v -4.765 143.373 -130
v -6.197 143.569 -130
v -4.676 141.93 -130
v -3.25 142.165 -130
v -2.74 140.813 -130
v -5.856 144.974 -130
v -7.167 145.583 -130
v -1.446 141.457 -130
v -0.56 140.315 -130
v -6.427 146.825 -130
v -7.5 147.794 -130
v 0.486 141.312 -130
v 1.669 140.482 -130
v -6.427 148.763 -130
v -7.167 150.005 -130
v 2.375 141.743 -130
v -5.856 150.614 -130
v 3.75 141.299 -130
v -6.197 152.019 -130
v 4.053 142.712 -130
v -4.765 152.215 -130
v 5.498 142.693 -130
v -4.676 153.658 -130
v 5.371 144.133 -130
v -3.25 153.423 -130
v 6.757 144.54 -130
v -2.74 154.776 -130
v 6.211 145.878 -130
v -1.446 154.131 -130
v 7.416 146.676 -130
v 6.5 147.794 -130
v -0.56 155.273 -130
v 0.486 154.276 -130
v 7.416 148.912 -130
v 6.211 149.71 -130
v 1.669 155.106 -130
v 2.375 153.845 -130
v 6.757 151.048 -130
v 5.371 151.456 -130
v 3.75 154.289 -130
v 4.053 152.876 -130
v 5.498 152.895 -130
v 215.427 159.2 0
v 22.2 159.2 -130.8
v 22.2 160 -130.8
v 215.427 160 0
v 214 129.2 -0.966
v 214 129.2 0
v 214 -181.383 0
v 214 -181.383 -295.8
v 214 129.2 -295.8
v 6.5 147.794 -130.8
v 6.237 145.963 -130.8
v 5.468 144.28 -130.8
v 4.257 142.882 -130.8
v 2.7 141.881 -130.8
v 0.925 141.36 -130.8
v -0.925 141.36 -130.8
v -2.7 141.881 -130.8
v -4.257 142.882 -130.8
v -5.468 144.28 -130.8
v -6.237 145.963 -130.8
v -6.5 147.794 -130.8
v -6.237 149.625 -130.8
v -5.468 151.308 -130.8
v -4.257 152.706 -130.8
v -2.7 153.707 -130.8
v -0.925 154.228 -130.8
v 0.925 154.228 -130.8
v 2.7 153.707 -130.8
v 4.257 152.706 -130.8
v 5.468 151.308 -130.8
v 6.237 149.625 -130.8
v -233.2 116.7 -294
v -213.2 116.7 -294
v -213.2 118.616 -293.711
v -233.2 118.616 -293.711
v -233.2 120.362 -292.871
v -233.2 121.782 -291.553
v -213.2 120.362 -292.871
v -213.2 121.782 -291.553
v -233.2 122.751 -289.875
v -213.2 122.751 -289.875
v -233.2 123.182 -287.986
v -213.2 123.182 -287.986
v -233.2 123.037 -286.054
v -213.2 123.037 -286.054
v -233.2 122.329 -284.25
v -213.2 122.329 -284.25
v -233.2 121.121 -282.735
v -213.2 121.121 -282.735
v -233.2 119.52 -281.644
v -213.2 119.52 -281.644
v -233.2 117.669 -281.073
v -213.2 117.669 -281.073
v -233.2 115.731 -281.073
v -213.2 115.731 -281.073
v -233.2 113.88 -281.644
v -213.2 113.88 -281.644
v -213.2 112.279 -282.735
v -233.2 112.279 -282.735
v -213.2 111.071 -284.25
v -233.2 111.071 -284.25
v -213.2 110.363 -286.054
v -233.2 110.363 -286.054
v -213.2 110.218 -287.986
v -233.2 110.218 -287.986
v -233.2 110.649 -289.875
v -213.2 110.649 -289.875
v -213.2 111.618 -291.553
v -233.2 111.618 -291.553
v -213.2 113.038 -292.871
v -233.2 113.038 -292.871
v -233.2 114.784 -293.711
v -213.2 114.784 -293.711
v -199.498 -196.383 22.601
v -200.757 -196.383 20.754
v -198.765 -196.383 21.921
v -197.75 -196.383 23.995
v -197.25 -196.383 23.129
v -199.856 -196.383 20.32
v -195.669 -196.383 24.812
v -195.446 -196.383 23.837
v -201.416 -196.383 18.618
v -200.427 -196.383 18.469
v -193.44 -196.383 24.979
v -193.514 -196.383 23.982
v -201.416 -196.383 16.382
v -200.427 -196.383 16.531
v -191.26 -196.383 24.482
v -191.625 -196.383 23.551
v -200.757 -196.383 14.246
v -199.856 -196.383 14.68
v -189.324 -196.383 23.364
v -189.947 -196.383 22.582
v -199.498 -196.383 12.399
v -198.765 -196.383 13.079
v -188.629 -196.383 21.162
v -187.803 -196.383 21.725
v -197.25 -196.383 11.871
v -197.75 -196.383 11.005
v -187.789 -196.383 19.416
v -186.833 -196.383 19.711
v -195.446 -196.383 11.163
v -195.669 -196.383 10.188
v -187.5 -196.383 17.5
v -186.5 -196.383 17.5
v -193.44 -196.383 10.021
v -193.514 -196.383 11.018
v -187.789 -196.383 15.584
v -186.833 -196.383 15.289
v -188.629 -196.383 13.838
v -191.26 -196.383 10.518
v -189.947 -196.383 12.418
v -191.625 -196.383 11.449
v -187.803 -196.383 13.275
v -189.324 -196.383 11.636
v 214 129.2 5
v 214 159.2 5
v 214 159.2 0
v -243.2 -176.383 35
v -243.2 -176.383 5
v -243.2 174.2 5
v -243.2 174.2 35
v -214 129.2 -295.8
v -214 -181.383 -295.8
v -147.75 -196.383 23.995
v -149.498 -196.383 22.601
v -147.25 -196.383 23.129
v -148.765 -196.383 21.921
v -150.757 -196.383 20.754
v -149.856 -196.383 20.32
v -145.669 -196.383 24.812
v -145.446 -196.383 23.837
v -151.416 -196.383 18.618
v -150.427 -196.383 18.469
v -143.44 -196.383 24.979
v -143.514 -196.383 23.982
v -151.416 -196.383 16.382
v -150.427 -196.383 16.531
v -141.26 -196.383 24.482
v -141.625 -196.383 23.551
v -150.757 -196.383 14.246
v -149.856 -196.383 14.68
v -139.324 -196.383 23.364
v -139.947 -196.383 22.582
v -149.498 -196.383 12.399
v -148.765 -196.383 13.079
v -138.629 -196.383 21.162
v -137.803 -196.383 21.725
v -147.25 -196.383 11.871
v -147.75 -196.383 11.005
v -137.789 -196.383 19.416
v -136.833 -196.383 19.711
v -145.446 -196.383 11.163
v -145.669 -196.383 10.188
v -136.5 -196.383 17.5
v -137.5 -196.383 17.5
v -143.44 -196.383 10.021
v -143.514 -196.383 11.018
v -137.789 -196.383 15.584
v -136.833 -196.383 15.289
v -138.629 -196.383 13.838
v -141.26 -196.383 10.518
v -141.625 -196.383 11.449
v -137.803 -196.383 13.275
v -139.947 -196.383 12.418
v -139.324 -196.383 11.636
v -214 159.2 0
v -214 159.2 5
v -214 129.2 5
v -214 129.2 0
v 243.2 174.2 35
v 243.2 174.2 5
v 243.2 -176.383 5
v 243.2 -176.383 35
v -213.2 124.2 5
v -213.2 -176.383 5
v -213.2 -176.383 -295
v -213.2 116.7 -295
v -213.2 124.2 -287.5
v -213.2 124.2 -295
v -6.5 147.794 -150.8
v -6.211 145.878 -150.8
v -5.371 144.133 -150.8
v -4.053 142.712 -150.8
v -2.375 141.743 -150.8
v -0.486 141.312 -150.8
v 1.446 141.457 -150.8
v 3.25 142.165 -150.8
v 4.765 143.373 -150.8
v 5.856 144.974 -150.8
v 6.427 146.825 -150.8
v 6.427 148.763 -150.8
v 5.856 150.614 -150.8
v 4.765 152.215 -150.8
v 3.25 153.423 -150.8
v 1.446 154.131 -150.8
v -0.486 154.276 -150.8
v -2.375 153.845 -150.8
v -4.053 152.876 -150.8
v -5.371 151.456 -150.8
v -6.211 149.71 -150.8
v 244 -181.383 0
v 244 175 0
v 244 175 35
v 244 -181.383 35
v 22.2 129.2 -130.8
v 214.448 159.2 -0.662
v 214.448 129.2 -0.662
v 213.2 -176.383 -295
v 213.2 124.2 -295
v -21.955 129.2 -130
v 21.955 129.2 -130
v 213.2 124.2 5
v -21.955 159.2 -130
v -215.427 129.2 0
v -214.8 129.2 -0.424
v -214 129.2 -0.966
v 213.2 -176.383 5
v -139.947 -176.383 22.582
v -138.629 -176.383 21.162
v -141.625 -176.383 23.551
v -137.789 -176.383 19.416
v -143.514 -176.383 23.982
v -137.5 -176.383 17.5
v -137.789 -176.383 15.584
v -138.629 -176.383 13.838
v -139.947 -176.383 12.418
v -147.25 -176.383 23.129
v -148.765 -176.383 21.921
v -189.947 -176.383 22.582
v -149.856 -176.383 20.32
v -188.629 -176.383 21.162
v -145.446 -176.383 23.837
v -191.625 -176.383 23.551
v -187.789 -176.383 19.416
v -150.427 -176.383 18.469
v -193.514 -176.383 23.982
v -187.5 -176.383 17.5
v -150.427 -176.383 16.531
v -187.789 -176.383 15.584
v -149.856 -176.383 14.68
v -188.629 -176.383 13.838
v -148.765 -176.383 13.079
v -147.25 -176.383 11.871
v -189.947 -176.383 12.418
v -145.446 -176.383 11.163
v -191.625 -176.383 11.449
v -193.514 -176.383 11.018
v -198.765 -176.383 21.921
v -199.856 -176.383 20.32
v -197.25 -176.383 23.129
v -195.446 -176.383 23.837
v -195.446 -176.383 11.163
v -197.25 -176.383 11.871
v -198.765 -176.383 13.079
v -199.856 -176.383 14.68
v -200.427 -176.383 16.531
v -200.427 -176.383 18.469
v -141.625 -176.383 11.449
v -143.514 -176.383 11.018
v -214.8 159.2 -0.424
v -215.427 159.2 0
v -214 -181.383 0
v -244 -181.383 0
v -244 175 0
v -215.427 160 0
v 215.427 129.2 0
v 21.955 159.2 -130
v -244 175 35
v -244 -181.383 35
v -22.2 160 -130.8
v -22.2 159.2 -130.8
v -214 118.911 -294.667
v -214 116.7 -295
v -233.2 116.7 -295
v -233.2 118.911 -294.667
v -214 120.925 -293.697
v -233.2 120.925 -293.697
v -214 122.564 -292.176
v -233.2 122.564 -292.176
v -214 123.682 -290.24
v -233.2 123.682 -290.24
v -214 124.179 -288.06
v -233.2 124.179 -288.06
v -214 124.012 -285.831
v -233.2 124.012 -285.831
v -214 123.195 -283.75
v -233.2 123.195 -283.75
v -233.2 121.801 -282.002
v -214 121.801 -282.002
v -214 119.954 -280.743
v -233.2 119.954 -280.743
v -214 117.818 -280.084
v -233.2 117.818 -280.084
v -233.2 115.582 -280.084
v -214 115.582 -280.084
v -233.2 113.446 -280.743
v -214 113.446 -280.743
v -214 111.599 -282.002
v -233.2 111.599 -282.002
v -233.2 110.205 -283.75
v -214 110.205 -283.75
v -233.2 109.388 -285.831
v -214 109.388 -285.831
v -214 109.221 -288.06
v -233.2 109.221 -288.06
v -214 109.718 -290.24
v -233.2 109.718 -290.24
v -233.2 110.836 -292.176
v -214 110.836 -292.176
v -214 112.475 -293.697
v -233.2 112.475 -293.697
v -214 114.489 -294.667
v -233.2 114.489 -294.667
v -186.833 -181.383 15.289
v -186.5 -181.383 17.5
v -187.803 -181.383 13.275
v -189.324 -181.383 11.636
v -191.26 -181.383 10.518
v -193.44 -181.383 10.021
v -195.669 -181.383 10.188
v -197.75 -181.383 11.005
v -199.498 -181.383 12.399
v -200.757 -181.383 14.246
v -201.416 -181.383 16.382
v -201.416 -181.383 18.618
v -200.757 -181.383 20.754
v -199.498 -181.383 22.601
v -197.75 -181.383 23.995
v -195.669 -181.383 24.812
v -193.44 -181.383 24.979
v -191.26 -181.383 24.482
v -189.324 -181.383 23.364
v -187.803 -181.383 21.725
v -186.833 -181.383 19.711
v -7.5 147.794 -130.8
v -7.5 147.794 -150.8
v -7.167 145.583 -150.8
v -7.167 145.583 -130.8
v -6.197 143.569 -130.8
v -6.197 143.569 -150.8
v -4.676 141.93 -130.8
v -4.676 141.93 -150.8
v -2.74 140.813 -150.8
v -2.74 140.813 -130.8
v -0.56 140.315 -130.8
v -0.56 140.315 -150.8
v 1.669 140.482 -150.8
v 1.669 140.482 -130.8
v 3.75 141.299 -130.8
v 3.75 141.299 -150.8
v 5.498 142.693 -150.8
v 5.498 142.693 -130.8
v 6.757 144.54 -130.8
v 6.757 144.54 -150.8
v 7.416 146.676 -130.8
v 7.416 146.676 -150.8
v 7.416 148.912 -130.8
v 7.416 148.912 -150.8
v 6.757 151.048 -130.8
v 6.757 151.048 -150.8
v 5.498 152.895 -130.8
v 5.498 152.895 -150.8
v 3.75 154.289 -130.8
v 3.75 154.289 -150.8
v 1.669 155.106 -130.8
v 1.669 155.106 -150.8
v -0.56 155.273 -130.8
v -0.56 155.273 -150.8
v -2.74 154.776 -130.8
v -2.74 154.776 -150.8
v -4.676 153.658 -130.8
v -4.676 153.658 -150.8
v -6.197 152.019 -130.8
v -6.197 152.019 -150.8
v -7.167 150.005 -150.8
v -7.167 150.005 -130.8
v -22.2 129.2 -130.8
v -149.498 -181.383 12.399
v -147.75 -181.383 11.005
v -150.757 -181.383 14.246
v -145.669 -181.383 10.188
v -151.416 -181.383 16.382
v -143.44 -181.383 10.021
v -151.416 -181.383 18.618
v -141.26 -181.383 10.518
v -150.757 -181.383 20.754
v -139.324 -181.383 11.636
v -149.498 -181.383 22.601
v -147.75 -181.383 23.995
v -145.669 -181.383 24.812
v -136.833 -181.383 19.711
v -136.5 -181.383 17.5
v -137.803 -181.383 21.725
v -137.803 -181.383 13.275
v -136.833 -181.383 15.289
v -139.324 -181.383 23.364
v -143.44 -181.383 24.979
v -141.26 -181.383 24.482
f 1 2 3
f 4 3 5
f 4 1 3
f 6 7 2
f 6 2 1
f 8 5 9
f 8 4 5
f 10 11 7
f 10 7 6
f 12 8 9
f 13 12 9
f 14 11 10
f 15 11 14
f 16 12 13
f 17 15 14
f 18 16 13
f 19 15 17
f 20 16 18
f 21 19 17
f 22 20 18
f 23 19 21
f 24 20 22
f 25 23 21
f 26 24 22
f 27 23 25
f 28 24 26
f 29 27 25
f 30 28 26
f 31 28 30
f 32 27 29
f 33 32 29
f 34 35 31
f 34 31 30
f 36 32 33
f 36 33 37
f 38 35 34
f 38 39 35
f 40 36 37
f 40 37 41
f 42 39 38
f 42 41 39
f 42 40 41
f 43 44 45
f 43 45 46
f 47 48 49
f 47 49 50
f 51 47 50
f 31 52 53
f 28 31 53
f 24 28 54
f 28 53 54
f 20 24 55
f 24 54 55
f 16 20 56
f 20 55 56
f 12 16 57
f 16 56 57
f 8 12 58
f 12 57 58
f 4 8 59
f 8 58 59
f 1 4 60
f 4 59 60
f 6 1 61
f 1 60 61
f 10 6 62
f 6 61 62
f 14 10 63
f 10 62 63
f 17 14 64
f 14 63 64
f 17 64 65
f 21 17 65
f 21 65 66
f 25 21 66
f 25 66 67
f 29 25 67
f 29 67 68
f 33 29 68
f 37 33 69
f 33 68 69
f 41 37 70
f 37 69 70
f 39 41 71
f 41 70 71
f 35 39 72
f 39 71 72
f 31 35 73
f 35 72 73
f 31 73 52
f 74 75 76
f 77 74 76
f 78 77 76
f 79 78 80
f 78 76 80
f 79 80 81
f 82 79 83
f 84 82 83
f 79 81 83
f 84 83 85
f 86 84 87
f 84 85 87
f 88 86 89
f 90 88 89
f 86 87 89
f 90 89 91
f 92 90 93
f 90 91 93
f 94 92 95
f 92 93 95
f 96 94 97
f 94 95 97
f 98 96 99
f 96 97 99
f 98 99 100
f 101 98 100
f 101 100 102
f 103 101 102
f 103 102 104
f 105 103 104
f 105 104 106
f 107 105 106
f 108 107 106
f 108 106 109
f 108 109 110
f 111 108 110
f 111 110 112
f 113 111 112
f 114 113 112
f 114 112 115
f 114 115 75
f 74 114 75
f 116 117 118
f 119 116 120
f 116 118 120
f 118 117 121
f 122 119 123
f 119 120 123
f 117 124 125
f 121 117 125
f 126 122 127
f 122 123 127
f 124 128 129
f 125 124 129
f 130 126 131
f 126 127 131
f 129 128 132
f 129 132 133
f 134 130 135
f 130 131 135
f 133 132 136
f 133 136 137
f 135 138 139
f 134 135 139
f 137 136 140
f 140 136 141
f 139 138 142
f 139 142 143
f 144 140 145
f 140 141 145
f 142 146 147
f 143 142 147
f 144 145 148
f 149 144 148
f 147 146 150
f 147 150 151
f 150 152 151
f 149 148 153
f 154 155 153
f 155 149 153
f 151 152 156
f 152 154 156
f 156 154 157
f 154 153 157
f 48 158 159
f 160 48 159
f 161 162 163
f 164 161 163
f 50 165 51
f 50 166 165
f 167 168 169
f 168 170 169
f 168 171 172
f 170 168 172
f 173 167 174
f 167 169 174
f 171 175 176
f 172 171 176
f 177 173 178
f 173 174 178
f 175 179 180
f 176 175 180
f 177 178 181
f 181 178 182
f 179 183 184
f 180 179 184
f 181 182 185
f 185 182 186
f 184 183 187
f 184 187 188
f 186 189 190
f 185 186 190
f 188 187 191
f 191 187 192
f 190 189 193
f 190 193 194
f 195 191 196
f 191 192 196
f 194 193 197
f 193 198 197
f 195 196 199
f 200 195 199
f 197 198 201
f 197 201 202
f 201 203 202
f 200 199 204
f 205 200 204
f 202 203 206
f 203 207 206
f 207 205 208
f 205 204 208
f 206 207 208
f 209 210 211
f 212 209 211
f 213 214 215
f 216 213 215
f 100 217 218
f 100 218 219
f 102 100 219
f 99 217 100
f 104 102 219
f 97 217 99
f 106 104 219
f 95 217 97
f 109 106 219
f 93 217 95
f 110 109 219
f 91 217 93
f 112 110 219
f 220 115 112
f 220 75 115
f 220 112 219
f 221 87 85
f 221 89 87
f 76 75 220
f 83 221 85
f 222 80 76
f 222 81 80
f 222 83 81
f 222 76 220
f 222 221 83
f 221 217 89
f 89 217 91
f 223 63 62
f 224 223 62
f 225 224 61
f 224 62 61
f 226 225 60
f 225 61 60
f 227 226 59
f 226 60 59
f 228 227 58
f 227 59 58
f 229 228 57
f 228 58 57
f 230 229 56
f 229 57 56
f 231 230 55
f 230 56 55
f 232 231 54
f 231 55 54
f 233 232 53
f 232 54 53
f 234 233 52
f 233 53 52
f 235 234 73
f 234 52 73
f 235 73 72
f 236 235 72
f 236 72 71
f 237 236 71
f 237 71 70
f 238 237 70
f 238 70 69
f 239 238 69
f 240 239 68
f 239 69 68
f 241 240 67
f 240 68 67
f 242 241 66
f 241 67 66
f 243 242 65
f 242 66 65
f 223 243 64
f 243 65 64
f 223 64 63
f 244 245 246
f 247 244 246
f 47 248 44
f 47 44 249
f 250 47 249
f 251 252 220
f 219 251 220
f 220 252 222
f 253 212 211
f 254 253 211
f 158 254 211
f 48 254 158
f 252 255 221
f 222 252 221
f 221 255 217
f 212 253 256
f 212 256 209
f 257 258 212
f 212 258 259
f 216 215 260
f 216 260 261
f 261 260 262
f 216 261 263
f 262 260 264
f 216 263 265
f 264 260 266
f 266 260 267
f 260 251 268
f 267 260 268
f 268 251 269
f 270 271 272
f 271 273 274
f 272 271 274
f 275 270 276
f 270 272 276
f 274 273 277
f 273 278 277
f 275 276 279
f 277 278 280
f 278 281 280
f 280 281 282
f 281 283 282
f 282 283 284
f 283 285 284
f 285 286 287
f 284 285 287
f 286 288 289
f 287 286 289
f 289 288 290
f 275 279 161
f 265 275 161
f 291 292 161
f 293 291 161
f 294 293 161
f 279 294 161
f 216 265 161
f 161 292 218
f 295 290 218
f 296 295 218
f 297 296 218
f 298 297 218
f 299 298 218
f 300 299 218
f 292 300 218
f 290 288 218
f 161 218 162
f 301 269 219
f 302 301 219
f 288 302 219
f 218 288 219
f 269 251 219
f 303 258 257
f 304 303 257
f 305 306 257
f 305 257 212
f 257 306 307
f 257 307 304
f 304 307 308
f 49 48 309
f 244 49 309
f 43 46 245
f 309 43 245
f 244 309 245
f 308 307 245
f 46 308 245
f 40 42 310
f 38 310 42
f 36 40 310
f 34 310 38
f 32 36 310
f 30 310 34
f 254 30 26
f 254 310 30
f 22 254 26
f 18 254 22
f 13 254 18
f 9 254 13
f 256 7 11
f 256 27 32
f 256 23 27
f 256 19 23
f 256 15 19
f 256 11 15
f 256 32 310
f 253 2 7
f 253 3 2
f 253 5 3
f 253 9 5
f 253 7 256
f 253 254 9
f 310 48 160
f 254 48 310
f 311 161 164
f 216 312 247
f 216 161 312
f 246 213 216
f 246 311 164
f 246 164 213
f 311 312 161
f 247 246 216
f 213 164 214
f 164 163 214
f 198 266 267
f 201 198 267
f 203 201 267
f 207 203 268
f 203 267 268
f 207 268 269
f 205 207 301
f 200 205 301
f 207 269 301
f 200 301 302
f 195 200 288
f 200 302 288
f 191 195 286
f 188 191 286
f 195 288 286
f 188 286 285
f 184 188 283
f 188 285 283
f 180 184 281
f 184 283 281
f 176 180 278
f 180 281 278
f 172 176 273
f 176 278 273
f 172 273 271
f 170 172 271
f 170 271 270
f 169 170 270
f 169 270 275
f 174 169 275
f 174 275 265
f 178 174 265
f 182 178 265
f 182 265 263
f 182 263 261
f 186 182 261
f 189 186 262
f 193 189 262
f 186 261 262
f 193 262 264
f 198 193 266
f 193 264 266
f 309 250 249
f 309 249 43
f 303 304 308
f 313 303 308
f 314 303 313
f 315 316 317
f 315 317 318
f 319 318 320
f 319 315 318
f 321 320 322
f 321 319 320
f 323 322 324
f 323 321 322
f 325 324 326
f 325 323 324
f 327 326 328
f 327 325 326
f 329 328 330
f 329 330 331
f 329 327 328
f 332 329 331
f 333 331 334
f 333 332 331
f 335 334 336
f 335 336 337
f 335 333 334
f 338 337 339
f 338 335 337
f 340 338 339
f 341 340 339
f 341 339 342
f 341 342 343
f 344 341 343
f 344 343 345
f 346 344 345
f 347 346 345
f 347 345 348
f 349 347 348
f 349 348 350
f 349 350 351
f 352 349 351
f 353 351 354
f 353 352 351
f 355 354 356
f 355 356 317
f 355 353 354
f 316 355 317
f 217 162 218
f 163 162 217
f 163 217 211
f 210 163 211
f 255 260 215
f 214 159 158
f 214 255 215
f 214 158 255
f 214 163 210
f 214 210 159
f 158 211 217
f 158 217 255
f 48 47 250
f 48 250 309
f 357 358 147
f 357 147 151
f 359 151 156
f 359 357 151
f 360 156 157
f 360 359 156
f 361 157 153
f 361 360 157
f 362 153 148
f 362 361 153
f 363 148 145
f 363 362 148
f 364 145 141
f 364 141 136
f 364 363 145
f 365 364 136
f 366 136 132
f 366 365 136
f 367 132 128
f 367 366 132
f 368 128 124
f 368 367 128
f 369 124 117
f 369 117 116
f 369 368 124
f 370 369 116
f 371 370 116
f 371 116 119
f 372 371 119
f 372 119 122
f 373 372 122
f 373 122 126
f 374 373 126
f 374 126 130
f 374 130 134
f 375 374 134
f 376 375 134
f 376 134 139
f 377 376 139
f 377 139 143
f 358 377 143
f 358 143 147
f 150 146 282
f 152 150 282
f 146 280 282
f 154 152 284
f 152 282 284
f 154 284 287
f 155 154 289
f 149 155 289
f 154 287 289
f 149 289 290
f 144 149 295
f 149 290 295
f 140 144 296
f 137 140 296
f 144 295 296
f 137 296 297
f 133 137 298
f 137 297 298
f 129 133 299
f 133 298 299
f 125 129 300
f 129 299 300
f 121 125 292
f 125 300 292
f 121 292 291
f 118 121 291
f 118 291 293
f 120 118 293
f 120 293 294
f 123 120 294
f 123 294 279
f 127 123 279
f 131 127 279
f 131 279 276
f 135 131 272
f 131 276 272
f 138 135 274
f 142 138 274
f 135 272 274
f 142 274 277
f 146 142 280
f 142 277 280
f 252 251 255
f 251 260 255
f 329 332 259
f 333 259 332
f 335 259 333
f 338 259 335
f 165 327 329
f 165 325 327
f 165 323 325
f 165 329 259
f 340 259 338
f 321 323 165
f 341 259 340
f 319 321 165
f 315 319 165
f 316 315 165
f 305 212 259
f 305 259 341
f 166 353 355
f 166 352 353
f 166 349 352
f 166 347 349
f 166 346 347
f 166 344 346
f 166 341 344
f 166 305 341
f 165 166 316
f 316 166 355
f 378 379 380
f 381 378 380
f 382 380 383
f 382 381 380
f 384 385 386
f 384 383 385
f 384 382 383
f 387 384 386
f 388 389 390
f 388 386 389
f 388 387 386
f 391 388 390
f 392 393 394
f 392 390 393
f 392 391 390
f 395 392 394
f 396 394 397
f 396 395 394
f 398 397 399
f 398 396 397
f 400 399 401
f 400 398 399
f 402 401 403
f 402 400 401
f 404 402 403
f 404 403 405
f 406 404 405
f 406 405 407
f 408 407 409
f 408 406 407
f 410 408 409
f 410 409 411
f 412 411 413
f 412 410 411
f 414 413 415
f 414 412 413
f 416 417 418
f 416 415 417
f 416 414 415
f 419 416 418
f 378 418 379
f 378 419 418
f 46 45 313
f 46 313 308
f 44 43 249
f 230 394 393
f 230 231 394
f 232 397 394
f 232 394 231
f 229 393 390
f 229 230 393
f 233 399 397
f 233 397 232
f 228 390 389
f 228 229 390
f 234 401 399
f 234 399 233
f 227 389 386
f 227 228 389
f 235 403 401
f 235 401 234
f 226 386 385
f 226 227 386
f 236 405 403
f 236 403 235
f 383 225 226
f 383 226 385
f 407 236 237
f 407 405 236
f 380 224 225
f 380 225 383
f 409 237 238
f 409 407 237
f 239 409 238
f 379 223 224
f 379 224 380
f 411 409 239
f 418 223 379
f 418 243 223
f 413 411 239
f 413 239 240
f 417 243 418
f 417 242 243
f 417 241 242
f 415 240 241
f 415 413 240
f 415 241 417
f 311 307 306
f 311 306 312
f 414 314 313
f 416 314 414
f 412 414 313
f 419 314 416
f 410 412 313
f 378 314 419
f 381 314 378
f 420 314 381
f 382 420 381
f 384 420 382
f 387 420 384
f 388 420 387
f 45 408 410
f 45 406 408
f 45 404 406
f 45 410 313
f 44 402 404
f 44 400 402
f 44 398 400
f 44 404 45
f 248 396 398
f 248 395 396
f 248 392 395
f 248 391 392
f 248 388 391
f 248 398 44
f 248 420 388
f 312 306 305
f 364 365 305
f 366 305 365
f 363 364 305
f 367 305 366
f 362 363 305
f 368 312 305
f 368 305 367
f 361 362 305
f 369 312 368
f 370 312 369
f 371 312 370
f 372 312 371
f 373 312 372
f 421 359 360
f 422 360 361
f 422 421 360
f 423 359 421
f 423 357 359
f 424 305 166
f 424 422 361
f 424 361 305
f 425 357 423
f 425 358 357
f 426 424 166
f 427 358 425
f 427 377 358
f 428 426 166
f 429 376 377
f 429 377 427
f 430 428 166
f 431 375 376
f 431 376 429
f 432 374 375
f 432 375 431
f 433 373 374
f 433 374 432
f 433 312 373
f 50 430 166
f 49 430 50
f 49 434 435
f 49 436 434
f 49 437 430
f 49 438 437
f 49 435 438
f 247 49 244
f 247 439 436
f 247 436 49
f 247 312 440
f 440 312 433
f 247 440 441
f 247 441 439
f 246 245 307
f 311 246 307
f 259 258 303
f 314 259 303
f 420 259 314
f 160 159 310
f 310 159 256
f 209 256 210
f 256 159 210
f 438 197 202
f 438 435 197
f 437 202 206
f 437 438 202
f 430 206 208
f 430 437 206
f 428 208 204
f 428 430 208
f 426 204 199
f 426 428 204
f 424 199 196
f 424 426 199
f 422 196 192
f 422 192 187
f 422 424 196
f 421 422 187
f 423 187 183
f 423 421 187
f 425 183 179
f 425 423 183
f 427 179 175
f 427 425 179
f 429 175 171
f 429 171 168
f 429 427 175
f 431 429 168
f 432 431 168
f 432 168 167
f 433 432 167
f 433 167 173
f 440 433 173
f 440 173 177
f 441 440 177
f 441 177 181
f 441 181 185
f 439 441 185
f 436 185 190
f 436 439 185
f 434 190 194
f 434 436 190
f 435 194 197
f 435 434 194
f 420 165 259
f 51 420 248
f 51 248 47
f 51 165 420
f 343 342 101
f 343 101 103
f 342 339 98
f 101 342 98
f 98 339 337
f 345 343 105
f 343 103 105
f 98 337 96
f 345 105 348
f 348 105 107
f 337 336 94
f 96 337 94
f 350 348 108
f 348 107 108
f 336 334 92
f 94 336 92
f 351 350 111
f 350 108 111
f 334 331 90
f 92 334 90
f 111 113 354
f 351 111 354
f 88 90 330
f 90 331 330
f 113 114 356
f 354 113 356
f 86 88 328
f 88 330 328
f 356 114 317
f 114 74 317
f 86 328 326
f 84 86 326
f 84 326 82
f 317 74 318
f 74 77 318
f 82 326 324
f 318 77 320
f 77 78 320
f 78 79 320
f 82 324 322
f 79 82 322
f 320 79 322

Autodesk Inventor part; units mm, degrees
ref_plane "YZ Plane" through (0, 0, 0) normal (1, 0, 0) x (0, 1, 0)
ref_plane "XZ Plane" through (0, 0, 0) normal (0, 1, 0) x (-1, 0, 0)
ref_plane "XY Plane" through (0, 0, 0) normal (0, 0, 1) x (1, 0, 0)
sketch "Sketch1" plane through (0, 0, 0) normal (0, 0, 1) x (1, 0, 0)
  line L0 (-204, -167.1829) -> (204, -167.1829) construction
  line L1 (204, -167.1829) -> (204, 115) construction
  line L2 (204, 115) -> (-204, 115) construction
  line L3 (-204, 115) -> (-204, -167.1829) construction
  line L4 (-214, -177.1829) -> (214, -177.1829)
  line L5 (214, -177.1829) -> (214, 125)
  line L6 (214, 125) -> (-214, 125)
  line L7 (-214, 125) -> (-214, -177.1829)
  line L8 (-244, -177.1829) -> (244, -177.1829)
  line L9 (244, -177.1829) -> (244, 175)
  line L10 (244, 175) -> (-244, 175)
  line L11 (-244, 175) -> (-244, -177.1829)
  point P0 (0, 0)
  dimension "d0" = 10
  dimension "d1" = 30
  dimension "d2" = 30
  dimension "d3" = 50
extrude "Extrusion1" add sketch "Sketch1" along normal blind 5 contours L8 L11 L10 L9 L5 L6 L7
sketch "Sketch2" plane through (0, 0, 5) normal (0, 0, 1) x (1, 0, 0)
  line L0 (-214, -177.1829) -> (-214, 125) projected
  line L1 (-214, 125) -> (214, 125) projected
  line L2 (214, 125) -> (214, -177.1829) projected
  line L3 (214, -177.1829) -> (244, -177.1829) projected
  line L4 (244, -177.1829) -> (244, 175) projected
  line L5 (244, 175) -> (-244, 175) projected
  line L6 (-244, 175) -> (-244, -177.1829) projected
  line L7 (-244, -177.1829) -> (-214, -177.1829) projected
  line L8 (213.2, 124.2) -> (-213.2, 124.2)
  line L9 (-213.2, 124.2) -> (-213.2, -176.3829)
  line L10 (-244, -177.9829) -> (-244.8, -177.9829)
  line L11 (-244.8, -177.9829) -> (-244.8, 175.8)
  line L12 (-244.8, 175.8) -> (244.8, 175.8)
  line L13 (244.8, 175.8) -> (244.8, -177.9829)
  line L14 (244.8, -177.9829) -> (213.2, -177.9829)
  line L15 (214, 125) -> (214, -177.1829) projected
  line L16 (-244, -177.1829) -> (-214, -177.1829) projected
  line L17 (213.2, -177.1829) -> (-214, -177.1829)
  line L18 (213.2, -176.3829) -> (-213.2, -176.3829)
  line L19 (213.2, -177.1829) -> (214, -177.1829)
  line L20 (213.2, -177.9829) -> (213.2, -177.1829)
  line L21 (213.2, -176.3829) -> (213.2, 124.2)
  point P0 (0, 0)
  dimension "d6" = 0.8
  dimension "d7" = 0.8
extrude "Extrusion2" add sketch "Sketch2" against normal blind 300 contours L0 L1 L2 L19 L17
sketch "Sketch3" plane through (0, 0, 5) normal (0, 0, 1) x (1, 0, 0)
  line L0 (-213.2, -176.3829) -> (-213.2, 124.2) projected
  line L1 (-213.2, 124.2) -> (213.2, 124.2) projected
  line L2 (213.2, 124.2) -> (213.2, -176.3829) projected
  line L3 (213.2, -176.3829) -> (-213.2, -176.3829) projected
  line L4 (-244, -177.1829) -> (244, -177.1829) projected
  line L5 (244, -177.1829) -> (244, 175) projected
  line L6 (244, 175) -> (-244, 175) projected
  line L7 (-244, 175) -> (-244, -177.1829) projected
  line L8 (243.2, -176.3829) -> (-243.2, -176.3829)
  line L9 (-243.2, -176.3829) -> (-243.2, 174.2)
  line L10 (-243.2, 174.2) -> (243.2, 174.2)
  line L11 (243.2, 174.2) -> (243.2, -176.3829)
  point P0 (0, 0)
  dimension "d10" = 0.8
extrude "Extrusion3" add sketch "Sketch3" along normal blind 30
sketch "Sketch5" plane through (0, 0, -295) normal (0, 0, -1) x (-1, 0, 0)
  line L0 (213.2, 124.2) -> (213.2, -176.3829) projected
  line L1 (213.2, -176.3829) -> (-213.2, -176.3829) projected
  line L2 (-213.2, -176.3829) -> (-213.2, 124.2) projected
  line L3 (-213.2, 124.2) -> (213.2, 124.2) projected
  line L4 (-214, -177.1829) -> (214, -177.1829) projected
  line L5 (214, -177.1829) -> (214, 125) projected
  line L6 (214, 125) -> (-214, 125) projected
  line L7 (-214, 125) -> (-214, -177.1829) projected
  point P0 (0, 0)
extrude "Extrusion5" add sketch "Sketch5" along normal blind 0.8 contours L0 L1 L2 L3 | L7 L6 L5 L4
sketch "Sketch7" plane through (214, -177.1829, 0) normal (0, -1, 0) x (1, 0, 0)
  line L0 (0, 0) -> (30, 0) projected
  line L1 (30, 0) -> (30, 35) projected
  line L2 (-458, 35) -> (30, 35) projected
  line L3 (-458, 0) -> (-458, 35) projected
  line L4 (-458, 0) -> (-428, 0) projected
  line L5 (-428, 0) -> (-428, -295.8) projected
  line L6 (0, -295.8) -> (-428, -295.8) projected
  line L7 (0, 0) -> (0, -295.8) projected
  point P0 (-214, 0)
extrude "Extrusion7" add sketch "Sketch7" along normal blind 4.2
sketch "Sketch10" plane through (-214, 125, 0) normal (0, 1, 0) x (1, 0, 0)
  line L0 (428, 0) -> (0, 0) projected
  line L1 (428, 0) -> (428, 295.8) projected
  line L2 (0, 295.8) -> (428, 295.8) projected
  line L3 (0, 0) -> (0, 295.8) projected
  point P0 (214, 0)
extrude "Extrusion10" add sketch "Sketch10" along normal blind 4.2
sketch "Sketch12" plane through (0, 0, 5) normal (0, 0, 1) x (1, 0, 0)
  line L0 (214, 129.2) -> (-214, 129.2) projected
  line L1 (-214, 129.2) -> (214, 129.2)
  line L2 (214, 129.2) -> (214, 159.2)
  line L3 (214, 159.2) -> (-214, 159.2)
  line L4 (-214, 159.2) -> (-214, 129.2)
  point P0 (0, 0)
  dimension "d35" = 30
extrude "Extrusion12" cut sketch "Sketch12" against normal through all
sketch "Sketch13" plane through (-214, 129.2, 0) normal (0, 1, 0) x (1, 0, 0)
  line L0 (428, -5) -> (428, 0) projected
  line L1 (0, -5) -> (0, 0) projected
  line L2 (214, -68.5291) -> (214, 358.2531) construction
  line L3 (428, 0) -> (235.9552, 130)
  line L4 (192.0448, 130) -> (0, 0)
  line L5 (-29.2, -5) -> (0.8, -5) projected
  line L6 (428, 0) -> (458, 0) projected
  line L7 (235.9552, 130) -> (192.0448, 130)
  line L8 (-0.8, 0.4245) -> (191.7995, 130.8)
  line L9 (191.7995, 130.8) -> (236.2005, 130.8)
  line L10 (236.2005, 130.8) -> (428.4485, 0.6625)
  line L11 (428.4485, 0.6625) -> (429.4271, 0)
  line L12 (-0.8, 0.4245) -> (-1.4271, 0)
  line L13 (429.4271, 0) -> (428, 0)
  line L14 (0, 0) -> (0, 295.8) projected
  line L15 (0, 0) -> (-1.4271, 0)
  point P0 (214, 0)
  point P1 (427.2, -5)
  dimension "d41" = 0.8
extrude "Extrusion13" add sketch "Sketch13" along normal up to surface (30 mm away)
sketch "Sketch14" plane through (-22.2005, 159.2, -130.8) normal (0, 1, 0) x (1, 0, 0)
  line L0 (236.2005, -130.8) -> (44.1556, -0.8) projected
  line L1 (237.6276, -130.8) -> (236.2005, -130.8) projected
  line L2 (44.401, 0) -> (237.6276, -130.8) projected
  line L3 (0, 0) -> (44.401, 0) projected
  line L4 (-193.2266, -130.8) -> (0, 0) projected
  line L5 (-191.7995, -130.8) -> (-193.2266, -130.8) projected
  line L6 (0.2453, -0.8) -> (-191.7995, -130.8) projected
  line L7 (44.1556, -0.8) -> (0.2453, -0.8) projected
  line L8 (236.2005, -130.8) -> (44.1556, -0.8) projected
  line L9 (236.2005, -130.8) -> (-191.7995, -130.8) projected
  line L10 (236.2005, -130.8) -> (-191.7995, -130.8)
  point P0 (22.2005, -130.8)
extrude "Extrusion14" add sketch "Sketch14" along normal blind 0.8
sketch "Sketch15" plane through (-22.2005, 160, -130.8) normal (0, 1, 0) x (1, 0, 0)
  point P0 (22.2005, -130.8)
sketch "Sketch16" plane through (22.2005, 129.2, -130.8) normal (0, 0, -1) x (-1, 0, 0)
  circle A0 centre (22.2005, 18.5941) radius 7.5
  point P0 (22.2005, -129.2)
  dimension "d46" = 15
extrude "Extrusion15" cut sketch "Sketch16" against normal blind 0.8
sketch "Sketch17" plane through (22.2005, 129.2, -130.8) normal (0, 0, -1) x (-1, 0, 0)
  circle A0 centre (22.2005, 18.5941) radius 7.5 projected
  circle A1 centre (22.2005, 18.5941) radius 6.5
  point P0 (22.2005, -129.2)
  dimension "d49" = 1
extrude "Extrusion16" add sketch "Sketch17" along normal blind 20
sketch "Sketch18" plane through (214, -181.3829, 0) normal (0, -1, 0) x (1, 0, 0)
  circle A0 centre (-408, 17.5) radius 7.5
  circle A1 centre (-358, 17.5) radius 7.5
  line L0 (-458, 35) -> (-458, 0) projected
  point P0 (-214, 0)
  dimension "d52" = 15
  dimension "d53" = 15
  dimension "d54" = 50
  dimension "d55" = 50
extrude "Extrusion17" cut sketch "Sketch18" against normal blind 20
sketch "Sketch19" plane through (-243.2, -176.3829, 5) normal (0, 1, 0) x (1, 0, 0)
  circle A0 centre (99.2, -12.5) radius 7.5 projected
  circle A1 centre (49.2, -12.5) radius 7.5 projected
  circle A2 centre (99.2, -12.5) radius 6.5
  circle A3 centre (49.2, -12.5) radius 6.5
  point P0 (243.2, 5)
  dimension "d58" = 1
  dimension "d59" = 1
extrude "Extrusion18" add sketch "Sketch19" against normal blind 20
sketch "Sketch20" plane through (0, 147.7941, -130.8) normal (0, 0, 1) x (1, 0, 0)
  circle A0 centre (0, 0) radius 6.5 projected
  circle A1 centre (0, 0) radius 7.5 projected
  point P0 (0, -147.7941)
extrude "Extrusion19" add sketch "Sketch20" along normal up to surface (0.8 mm away)
sketch "Sketch21" plane through (-214, -181.3829, -295.8) normal (-1, 0, 0) x (0, 0, 1)
  line L0 (300.8, 305.5829) -> (0.8, 305.5829) projected
  line L1 (0.8, 305.5829) -> (0.8, 5) projected
  circle A0 centre (8.3, 298.0829) radius 7.5
  point P0 (295.8, 181.3829)
  dimension "d64" = 15
extrude "Extrusion20" cut sketch "Sketch21" against normal blind 20 contours A0
sketch "Sketch22" plane through (-213.2, -176.3829, 5) normal (1, 0, 0) x (0, 0, -1)
  circle A0 centre (292.5, 293.0829) radius 7.5 projected
  circle A1 centre (292.5, 293.0829) radius 6.5
  point P0 (5, 176.3829)
  dimension "d67" = 1
extrude "Extrusion21" add sketch "Sketch22" against normal blind 20
properties part number "Tank2"
